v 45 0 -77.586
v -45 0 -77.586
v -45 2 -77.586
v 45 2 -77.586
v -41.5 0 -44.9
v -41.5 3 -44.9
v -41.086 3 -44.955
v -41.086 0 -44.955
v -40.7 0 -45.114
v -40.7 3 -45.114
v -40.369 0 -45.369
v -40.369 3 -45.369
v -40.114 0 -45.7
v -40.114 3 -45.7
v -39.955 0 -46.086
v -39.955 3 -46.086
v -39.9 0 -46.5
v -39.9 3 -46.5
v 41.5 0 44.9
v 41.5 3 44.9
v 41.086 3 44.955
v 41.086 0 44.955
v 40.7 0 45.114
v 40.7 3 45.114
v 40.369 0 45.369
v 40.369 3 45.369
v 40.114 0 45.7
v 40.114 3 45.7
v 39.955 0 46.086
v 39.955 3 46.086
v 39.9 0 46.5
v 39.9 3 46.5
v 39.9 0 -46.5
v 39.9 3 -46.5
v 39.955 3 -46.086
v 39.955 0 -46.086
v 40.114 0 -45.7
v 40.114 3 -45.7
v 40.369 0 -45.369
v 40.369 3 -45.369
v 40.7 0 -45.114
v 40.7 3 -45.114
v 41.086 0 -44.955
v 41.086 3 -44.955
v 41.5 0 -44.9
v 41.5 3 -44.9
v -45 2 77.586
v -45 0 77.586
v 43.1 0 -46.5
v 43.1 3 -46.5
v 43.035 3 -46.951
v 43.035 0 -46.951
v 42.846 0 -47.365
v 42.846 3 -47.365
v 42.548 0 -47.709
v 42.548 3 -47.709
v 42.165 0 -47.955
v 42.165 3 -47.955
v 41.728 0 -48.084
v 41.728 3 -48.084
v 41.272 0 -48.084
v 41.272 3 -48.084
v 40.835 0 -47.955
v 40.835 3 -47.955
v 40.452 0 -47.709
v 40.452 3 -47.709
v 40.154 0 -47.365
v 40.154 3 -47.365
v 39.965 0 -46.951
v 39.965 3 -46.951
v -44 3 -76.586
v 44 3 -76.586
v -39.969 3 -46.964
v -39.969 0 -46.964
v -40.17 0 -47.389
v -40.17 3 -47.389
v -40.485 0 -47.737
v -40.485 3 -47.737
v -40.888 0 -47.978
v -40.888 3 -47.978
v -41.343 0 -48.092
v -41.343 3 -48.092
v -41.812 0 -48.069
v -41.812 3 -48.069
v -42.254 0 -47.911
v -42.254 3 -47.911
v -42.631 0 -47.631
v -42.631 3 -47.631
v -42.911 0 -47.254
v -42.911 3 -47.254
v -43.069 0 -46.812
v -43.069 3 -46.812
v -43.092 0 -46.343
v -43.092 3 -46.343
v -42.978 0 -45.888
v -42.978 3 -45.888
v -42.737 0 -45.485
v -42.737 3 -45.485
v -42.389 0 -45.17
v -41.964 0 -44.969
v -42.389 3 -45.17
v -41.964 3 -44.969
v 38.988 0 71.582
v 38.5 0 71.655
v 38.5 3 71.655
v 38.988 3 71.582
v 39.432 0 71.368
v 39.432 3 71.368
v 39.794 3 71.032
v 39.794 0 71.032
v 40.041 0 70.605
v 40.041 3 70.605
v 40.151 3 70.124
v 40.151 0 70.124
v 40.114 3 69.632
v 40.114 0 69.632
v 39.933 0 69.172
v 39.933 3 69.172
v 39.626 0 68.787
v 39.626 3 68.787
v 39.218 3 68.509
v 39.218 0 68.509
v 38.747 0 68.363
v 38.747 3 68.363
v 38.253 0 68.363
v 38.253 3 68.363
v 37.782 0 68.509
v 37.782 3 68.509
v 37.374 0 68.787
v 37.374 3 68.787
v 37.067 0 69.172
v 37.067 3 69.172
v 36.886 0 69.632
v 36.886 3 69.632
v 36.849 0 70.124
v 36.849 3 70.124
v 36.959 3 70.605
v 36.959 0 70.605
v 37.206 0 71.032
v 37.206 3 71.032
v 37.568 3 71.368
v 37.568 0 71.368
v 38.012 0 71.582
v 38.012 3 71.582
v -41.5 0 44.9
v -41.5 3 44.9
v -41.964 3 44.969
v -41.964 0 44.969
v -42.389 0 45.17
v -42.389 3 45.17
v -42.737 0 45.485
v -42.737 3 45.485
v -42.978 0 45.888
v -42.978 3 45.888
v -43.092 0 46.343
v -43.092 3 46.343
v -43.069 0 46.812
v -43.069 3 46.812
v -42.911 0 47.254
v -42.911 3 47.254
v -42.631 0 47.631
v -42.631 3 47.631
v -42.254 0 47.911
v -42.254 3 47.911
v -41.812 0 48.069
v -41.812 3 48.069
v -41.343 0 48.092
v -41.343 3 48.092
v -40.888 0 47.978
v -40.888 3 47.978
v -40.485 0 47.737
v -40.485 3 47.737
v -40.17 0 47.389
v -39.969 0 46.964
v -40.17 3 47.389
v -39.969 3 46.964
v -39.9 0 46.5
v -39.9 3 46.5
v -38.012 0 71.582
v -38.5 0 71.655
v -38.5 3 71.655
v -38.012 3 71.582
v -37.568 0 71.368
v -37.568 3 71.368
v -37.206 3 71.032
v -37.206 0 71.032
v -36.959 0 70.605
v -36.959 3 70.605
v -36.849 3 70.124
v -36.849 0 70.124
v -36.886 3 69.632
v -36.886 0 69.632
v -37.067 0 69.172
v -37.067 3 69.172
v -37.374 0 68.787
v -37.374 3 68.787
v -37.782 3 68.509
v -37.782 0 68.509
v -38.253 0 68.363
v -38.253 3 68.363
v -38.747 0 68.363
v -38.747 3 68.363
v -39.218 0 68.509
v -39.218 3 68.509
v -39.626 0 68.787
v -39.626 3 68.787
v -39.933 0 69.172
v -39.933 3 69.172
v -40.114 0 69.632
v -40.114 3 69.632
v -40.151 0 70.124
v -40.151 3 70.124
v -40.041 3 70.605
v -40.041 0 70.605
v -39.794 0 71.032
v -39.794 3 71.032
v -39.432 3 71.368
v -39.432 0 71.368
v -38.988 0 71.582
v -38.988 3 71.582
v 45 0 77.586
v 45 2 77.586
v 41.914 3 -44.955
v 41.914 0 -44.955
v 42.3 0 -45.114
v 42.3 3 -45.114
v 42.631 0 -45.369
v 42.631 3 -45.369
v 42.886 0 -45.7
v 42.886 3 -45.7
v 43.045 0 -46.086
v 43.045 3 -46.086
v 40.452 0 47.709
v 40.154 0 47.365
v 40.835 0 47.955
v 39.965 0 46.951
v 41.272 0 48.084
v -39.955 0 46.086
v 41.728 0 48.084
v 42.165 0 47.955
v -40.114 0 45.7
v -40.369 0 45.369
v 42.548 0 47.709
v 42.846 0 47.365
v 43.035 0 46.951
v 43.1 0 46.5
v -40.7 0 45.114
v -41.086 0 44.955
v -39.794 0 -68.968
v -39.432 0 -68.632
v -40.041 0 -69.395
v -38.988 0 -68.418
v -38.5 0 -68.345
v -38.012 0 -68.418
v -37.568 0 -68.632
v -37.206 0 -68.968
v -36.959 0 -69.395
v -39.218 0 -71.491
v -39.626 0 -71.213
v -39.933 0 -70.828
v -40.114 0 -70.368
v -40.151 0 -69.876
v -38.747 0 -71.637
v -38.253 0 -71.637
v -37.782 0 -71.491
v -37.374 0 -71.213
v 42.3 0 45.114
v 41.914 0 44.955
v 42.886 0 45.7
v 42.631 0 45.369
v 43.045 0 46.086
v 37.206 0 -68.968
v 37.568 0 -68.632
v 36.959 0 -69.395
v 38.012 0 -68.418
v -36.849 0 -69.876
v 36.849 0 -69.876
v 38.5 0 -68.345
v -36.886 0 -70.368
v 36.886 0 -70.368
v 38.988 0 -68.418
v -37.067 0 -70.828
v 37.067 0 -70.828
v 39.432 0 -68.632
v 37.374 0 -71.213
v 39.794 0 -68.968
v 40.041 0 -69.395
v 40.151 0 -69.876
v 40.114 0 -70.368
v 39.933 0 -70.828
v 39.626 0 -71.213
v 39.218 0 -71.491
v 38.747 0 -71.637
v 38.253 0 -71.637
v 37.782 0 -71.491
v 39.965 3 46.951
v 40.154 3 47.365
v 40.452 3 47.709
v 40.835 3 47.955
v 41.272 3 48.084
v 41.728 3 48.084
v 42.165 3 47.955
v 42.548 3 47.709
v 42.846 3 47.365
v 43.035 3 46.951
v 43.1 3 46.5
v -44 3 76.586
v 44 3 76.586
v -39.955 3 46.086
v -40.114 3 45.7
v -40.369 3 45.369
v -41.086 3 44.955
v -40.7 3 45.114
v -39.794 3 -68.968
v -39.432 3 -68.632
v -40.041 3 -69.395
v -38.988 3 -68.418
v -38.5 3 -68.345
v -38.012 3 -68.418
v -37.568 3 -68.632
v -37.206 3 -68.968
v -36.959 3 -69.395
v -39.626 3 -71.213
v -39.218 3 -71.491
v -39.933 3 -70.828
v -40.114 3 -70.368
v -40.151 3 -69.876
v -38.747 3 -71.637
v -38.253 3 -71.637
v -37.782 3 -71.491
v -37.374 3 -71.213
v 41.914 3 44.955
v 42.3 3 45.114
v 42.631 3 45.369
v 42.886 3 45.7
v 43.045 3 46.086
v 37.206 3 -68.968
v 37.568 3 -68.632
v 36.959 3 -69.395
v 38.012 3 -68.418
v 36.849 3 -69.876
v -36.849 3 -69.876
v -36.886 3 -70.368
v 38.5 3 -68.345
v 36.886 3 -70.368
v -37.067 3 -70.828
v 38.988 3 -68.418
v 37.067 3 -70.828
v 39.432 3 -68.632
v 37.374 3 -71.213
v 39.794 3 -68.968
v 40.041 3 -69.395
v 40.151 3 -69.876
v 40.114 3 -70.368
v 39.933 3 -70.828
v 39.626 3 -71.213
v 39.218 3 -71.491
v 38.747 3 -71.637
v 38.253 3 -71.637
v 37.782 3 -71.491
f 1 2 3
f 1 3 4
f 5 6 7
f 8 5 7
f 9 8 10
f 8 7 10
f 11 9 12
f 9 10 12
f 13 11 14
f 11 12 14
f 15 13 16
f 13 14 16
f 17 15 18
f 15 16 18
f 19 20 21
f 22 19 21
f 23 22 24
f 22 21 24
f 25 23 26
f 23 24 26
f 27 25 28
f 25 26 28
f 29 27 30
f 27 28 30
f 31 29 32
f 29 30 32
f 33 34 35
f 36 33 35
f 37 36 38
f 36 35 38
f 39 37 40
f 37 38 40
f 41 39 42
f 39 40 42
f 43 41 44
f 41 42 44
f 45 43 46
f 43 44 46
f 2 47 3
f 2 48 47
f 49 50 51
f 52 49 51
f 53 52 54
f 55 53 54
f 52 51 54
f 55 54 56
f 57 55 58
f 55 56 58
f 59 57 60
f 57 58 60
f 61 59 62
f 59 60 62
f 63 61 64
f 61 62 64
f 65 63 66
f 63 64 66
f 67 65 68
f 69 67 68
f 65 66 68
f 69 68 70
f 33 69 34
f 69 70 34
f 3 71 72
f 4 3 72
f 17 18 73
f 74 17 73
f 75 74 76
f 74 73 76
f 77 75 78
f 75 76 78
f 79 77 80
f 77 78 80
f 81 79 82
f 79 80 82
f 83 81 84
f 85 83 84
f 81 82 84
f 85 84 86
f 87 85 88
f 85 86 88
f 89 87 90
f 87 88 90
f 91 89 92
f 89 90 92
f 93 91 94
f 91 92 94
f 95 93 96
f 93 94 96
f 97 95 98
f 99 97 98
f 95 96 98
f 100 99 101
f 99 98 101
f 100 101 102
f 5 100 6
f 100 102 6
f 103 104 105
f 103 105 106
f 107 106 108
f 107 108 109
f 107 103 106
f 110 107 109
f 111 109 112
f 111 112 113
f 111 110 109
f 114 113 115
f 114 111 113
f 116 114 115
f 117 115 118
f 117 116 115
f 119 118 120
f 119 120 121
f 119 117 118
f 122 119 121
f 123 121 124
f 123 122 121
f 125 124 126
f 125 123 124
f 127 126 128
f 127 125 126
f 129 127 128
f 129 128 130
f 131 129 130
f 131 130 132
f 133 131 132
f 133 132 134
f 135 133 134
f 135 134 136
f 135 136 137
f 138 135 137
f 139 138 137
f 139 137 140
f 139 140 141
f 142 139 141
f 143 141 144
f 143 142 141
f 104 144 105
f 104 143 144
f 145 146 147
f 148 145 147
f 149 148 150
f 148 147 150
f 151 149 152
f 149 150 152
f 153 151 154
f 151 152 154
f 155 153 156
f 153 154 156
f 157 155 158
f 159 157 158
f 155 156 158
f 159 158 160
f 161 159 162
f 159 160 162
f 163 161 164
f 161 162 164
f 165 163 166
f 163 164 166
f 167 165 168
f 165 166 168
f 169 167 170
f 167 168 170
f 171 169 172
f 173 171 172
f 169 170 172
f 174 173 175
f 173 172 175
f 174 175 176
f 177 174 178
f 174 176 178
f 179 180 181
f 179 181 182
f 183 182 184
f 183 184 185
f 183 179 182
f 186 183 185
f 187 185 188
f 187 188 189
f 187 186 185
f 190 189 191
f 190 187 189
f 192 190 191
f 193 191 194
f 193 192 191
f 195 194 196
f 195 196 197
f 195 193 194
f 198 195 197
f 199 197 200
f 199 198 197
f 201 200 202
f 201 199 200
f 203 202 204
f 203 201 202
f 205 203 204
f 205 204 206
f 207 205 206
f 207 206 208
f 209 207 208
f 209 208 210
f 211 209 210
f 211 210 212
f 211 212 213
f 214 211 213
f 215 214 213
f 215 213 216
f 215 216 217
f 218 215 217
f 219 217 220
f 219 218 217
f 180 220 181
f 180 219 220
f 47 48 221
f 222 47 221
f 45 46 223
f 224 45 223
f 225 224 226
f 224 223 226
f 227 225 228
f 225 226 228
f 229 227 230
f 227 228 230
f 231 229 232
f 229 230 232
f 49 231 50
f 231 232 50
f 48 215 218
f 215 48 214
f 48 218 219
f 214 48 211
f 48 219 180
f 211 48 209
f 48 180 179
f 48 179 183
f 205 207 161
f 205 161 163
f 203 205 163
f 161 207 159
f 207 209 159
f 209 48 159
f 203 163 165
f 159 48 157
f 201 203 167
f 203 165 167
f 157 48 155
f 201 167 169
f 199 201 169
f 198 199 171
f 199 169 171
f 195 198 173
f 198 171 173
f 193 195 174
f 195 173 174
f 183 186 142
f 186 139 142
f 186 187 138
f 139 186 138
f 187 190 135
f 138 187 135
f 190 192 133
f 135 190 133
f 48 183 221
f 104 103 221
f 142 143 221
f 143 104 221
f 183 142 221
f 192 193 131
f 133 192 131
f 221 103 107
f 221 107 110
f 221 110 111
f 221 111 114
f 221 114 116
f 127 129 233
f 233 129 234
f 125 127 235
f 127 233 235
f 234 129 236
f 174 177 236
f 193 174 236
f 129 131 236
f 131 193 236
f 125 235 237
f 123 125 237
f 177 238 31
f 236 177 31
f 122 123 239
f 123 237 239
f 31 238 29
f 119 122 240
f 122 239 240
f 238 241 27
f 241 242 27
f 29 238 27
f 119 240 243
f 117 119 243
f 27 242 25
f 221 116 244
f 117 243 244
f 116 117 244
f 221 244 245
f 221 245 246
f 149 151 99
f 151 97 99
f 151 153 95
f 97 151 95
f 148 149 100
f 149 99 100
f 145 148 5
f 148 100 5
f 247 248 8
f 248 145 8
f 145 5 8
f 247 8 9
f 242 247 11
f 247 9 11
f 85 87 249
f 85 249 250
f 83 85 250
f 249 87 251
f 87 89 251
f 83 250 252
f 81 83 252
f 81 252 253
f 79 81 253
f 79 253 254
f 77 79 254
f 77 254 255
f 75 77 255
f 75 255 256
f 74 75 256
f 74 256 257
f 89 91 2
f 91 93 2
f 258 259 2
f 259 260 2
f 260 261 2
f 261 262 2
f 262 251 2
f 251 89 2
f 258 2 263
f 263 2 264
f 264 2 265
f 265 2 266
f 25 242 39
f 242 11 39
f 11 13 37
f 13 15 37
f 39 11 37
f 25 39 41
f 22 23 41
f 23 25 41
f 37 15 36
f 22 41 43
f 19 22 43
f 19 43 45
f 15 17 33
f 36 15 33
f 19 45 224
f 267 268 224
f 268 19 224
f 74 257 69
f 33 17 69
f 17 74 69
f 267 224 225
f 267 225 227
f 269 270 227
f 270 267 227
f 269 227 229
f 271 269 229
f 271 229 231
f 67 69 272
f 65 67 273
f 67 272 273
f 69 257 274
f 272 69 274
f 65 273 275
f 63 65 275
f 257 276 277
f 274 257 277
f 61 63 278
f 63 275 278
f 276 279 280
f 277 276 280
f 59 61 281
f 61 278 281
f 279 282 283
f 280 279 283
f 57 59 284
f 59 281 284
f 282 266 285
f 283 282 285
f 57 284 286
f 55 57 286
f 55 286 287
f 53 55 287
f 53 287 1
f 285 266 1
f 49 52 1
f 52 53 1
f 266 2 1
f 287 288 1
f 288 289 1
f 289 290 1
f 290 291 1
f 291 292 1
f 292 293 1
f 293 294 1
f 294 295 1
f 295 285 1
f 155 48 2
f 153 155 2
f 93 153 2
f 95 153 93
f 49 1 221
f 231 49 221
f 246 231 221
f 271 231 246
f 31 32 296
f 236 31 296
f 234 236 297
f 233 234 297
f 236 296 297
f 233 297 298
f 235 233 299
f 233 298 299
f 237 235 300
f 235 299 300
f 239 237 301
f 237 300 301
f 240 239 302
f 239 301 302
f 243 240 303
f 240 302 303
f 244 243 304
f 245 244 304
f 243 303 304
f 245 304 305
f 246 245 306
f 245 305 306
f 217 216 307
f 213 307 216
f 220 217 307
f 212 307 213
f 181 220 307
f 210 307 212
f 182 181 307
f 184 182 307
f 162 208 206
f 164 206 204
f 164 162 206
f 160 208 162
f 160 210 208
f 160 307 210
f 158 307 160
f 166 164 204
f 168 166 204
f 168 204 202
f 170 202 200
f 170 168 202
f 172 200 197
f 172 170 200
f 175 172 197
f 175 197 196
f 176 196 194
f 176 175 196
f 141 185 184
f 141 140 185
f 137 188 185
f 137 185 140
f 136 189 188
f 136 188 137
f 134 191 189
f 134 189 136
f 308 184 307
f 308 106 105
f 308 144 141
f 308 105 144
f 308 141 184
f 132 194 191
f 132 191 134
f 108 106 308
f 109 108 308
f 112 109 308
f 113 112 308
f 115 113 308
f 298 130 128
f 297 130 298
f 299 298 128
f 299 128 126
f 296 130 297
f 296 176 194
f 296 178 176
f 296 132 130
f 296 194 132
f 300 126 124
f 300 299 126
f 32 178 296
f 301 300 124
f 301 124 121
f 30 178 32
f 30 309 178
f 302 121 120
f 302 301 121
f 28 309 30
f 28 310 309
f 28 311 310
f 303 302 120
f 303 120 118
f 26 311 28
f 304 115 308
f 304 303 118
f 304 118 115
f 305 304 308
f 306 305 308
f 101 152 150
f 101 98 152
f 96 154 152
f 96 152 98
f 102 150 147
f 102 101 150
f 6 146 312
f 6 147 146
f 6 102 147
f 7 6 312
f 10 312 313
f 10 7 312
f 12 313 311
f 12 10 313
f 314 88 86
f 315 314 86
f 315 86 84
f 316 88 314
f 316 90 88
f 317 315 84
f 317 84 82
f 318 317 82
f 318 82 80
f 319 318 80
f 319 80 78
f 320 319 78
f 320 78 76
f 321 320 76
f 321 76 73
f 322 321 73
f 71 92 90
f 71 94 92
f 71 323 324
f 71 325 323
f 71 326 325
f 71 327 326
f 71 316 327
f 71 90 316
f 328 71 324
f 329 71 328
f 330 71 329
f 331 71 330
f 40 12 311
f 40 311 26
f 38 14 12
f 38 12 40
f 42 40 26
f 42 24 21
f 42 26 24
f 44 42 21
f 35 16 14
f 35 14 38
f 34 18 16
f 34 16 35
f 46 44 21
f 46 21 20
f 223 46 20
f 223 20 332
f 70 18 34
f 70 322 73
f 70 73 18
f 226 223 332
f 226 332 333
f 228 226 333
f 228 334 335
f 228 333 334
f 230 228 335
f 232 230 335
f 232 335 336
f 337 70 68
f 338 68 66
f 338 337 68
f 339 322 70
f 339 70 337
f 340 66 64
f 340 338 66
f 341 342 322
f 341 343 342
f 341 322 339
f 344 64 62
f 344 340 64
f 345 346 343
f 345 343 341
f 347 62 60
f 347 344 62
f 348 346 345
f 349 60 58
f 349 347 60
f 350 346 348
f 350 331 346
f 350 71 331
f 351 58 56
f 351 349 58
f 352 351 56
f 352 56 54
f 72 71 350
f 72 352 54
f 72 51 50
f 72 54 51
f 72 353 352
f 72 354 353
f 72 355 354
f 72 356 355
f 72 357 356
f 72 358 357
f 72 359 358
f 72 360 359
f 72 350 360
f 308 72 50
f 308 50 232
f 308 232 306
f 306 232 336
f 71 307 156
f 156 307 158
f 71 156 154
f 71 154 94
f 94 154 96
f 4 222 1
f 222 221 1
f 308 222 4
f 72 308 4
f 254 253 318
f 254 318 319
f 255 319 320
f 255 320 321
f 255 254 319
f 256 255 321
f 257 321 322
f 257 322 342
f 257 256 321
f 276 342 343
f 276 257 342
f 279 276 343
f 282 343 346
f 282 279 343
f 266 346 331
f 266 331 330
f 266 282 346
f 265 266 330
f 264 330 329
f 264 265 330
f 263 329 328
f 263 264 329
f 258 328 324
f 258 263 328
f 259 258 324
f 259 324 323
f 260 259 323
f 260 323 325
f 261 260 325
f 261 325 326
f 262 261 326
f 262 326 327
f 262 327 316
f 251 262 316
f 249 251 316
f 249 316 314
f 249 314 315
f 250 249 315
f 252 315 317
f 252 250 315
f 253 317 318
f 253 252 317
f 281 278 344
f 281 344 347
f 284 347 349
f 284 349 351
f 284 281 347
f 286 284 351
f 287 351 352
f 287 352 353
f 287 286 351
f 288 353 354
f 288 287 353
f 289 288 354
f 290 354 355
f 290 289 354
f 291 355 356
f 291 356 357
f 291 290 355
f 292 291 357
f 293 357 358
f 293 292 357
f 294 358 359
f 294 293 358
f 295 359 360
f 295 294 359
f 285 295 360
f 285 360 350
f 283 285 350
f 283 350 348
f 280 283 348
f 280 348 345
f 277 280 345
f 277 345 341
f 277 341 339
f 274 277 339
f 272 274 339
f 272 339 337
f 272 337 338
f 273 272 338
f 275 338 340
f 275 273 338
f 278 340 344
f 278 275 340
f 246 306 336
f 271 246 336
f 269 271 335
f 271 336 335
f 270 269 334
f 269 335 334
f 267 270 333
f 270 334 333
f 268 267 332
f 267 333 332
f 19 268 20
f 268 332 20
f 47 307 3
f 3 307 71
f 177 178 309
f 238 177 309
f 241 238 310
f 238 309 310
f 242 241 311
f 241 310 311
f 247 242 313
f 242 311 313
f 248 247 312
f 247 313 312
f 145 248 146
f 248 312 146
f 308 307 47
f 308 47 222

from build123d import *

# Parameters (mm, degrees)
SKETCH1_W           = 90
SKETCH1_H           = 155.172413794
SKETCH1_R           = 1.655172414
BOSS_EXTRUDE1_DEPTH = 3
CUT_EXTRUDE1_DEPTH  = 90.741960646
CHAMFER1_SIZE       = 1
CHAMFER2_SIZE       = 1


with BuildPart() as part:
    # Sketch1 → Boss-Extrude1 (new body)
    with BuildSketch(Plane(origin=(0, 0, 0), x_dir=(1, 0, 0), z_dir=(0, 1, 0))):
        Rectangle(SKETCH1_W, SKETCH1_H)
        with Locations(Location((38.5, -70, 0), (0, 0, 270))):
            Circle(SKETCH1_R, mode=Mode.SUBTRACT)
        with Locations(Location((-38.5, -70, 0), (0, 0, 270))):
            Circle(SKETCH1_R, mode=Mode.SUBTRACT)
        with Locations(Location((38.5, 70, 0), (0, 0, 270))):
            Circle(SKETCH1_R, mode=Mode.SUBTRACT)
        with Locations(Location((-38.5, 70, 0), (0, 0, 270))):
            Circle(SKETCH1_R, mode=Mode.SUBTRACT)
    extrude(amount=BOSS_EXTRUDE1_DEPTH)

    # Sketch2 → Cut-Extrude1 (cut, through all)
    with BuildSketch(Plane(origin=(0, 3, 0), x_dir=(1, 0, 0), z_dir=(0, 1, 0))):
        with BuildLine():
            ThreePointArc((-39.9, 46.5), (-42.63137085, 47.63137085), (-41.5, 44.9))
            Line((-41.5, 44.9), (-41.5, 46.5))
            Line((-41.5, 46.5), (-39.9, 46.5))
        make_face()
        with BuildLine():
            Line((-41.5, 46.5), (-41.5, 44.9))
            ThreePointArc((-41.5, 44.9), (-40.36862915, 45.36862915), (-39.9, 46.5))
            Line((-39.9, 46.5), (-41.5, 46.5))
        make_face()
        with BuildLine():
            ThreePointArc((39.9, 46.5), (40.36862915, 45.36862915), (41.5, 44.9))
            Line((41.5, 44.9), (41.5, 46.5))
            Line((41.5, 46.5), (39.9, 46.5))
        make_face()
        with BuildLine():
            Line((41.5, 46.5), (41.5, 44.9))
            ThreePointArc((41.5, 44.9), (42.63137085, 45.36862915), (43.1, 46.5))
            ThreePointArc((43.1, 46.5), (41.5, 48.1), (39.9, 46.5))
            Line((39.9, 46.5), (41.5, 46.5))
        make_face()
        with BuildLine():
            ThreePointArc((41.5, -44.9), (40.36862915, -45.36862915), (39.9, -46.5))
            Line((39.9, -46.5), (41.5, -46.5))
            Line((41.5, -46.5), (41.5, -44.9))
        make_face()
        with BuildLine():
            Line((41.5, -46.5), (39.9, -46.5))
            ThreePointArc((39.9, -46.5), (41.5, -48.1), (43.1, -46.5))
            ThreePointArc((43.1, -46.5), (42.63137085, -45.36862915), (41.5, -44.9))
            Line((41.5, -44.9), (41.5, -46.5))
        make_face()
        with BuildLine():
            Line((-41.5, -44.9), (-41.5, -46.5))
            Line((-41.5, -46.5), (-39.9, -46.5))
            ThreePointArc((-39.9, -46.5), (-40.36862915, -45.36862915), (-41.5, -44.9))
        make_face()
        with BuildLine():
            Line((-39.9, -46.5), (-41.5, -46.5))
            Line((-41.5, -46.5), (-41.5, -44.9))
            ThreePointArc((-41.5, -44.9), (-42.63137085, -47.63137085), (-39.9, -46.5))
        make_face()
    extrude(amount=-CUT_EXTRUDE1_DEPTH, mode=Mode.SUBTRACT)

    # Chamfer1
    chamfer1_edges = [part.edges().sort_by_distance(p)[0] for p in [
        (0, 3, 77.586206897),
        (0, 3, -77.586206897),
    ]]
    chamfer(chamfer1_edges, length=CHAMFER1_SIZE)

    # Chamfer2
    chamfer2_edges = [part.edges().sort_by_distance(p)[0] for p in [
        (45, 3, 0),
        (-45, 3, 0),
    ]]
    chamfer(chamfer2_edges, length=CHAMFER2_SIZE)


solid = part.part
